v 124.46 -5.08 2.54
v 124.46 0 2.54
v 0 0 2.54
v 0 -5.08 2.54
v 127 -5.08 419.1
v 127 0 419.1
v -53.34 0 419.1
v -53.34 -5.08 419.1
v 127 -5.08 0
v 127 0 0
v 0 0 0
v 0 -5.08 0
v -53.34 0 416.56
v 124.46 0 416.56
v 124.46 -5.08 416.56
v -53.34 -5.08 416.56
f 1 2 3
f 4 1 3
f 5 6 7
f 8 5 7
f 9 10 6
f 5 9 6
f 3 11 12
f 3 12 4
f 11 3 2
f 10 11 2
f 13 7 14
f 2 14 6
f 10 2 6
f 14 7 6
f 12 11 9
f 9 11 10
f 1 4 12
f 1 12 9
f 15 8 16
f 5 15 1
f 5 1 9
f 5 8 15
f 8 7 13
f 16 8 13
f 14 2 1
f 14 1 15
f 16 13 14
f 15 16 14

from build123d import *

# Parameters (mm, degrees)
F0_W     = 124.46
F0_H     = 2.54
F0_W_2   = 2.54
F0_H_2   = 414.02
F1_DEPTH = 5.08


with BuildPart() as f1:
    # F0 (on Front) → F1 (new body)
    with BuildSketch(Plane.XZ):
        with Locations((62.23, 1.27)):
            Rectangle(F0_W, F0_H)
        with Locations((125.73, 1.27)):
            Rectangle(F0_W_2, F0_H)
        with Locations((125.73, 209.55)):
            Rectangle(F0_W_2, F0_H_2)
        Polygon((-53.34, 416.56), (124.46, 416.56), (127, 416.56), (127, 419.1), (-53.34, 419.1), align=None)
    extrude(amount=F1_DEPTH)


solid = f1.part
